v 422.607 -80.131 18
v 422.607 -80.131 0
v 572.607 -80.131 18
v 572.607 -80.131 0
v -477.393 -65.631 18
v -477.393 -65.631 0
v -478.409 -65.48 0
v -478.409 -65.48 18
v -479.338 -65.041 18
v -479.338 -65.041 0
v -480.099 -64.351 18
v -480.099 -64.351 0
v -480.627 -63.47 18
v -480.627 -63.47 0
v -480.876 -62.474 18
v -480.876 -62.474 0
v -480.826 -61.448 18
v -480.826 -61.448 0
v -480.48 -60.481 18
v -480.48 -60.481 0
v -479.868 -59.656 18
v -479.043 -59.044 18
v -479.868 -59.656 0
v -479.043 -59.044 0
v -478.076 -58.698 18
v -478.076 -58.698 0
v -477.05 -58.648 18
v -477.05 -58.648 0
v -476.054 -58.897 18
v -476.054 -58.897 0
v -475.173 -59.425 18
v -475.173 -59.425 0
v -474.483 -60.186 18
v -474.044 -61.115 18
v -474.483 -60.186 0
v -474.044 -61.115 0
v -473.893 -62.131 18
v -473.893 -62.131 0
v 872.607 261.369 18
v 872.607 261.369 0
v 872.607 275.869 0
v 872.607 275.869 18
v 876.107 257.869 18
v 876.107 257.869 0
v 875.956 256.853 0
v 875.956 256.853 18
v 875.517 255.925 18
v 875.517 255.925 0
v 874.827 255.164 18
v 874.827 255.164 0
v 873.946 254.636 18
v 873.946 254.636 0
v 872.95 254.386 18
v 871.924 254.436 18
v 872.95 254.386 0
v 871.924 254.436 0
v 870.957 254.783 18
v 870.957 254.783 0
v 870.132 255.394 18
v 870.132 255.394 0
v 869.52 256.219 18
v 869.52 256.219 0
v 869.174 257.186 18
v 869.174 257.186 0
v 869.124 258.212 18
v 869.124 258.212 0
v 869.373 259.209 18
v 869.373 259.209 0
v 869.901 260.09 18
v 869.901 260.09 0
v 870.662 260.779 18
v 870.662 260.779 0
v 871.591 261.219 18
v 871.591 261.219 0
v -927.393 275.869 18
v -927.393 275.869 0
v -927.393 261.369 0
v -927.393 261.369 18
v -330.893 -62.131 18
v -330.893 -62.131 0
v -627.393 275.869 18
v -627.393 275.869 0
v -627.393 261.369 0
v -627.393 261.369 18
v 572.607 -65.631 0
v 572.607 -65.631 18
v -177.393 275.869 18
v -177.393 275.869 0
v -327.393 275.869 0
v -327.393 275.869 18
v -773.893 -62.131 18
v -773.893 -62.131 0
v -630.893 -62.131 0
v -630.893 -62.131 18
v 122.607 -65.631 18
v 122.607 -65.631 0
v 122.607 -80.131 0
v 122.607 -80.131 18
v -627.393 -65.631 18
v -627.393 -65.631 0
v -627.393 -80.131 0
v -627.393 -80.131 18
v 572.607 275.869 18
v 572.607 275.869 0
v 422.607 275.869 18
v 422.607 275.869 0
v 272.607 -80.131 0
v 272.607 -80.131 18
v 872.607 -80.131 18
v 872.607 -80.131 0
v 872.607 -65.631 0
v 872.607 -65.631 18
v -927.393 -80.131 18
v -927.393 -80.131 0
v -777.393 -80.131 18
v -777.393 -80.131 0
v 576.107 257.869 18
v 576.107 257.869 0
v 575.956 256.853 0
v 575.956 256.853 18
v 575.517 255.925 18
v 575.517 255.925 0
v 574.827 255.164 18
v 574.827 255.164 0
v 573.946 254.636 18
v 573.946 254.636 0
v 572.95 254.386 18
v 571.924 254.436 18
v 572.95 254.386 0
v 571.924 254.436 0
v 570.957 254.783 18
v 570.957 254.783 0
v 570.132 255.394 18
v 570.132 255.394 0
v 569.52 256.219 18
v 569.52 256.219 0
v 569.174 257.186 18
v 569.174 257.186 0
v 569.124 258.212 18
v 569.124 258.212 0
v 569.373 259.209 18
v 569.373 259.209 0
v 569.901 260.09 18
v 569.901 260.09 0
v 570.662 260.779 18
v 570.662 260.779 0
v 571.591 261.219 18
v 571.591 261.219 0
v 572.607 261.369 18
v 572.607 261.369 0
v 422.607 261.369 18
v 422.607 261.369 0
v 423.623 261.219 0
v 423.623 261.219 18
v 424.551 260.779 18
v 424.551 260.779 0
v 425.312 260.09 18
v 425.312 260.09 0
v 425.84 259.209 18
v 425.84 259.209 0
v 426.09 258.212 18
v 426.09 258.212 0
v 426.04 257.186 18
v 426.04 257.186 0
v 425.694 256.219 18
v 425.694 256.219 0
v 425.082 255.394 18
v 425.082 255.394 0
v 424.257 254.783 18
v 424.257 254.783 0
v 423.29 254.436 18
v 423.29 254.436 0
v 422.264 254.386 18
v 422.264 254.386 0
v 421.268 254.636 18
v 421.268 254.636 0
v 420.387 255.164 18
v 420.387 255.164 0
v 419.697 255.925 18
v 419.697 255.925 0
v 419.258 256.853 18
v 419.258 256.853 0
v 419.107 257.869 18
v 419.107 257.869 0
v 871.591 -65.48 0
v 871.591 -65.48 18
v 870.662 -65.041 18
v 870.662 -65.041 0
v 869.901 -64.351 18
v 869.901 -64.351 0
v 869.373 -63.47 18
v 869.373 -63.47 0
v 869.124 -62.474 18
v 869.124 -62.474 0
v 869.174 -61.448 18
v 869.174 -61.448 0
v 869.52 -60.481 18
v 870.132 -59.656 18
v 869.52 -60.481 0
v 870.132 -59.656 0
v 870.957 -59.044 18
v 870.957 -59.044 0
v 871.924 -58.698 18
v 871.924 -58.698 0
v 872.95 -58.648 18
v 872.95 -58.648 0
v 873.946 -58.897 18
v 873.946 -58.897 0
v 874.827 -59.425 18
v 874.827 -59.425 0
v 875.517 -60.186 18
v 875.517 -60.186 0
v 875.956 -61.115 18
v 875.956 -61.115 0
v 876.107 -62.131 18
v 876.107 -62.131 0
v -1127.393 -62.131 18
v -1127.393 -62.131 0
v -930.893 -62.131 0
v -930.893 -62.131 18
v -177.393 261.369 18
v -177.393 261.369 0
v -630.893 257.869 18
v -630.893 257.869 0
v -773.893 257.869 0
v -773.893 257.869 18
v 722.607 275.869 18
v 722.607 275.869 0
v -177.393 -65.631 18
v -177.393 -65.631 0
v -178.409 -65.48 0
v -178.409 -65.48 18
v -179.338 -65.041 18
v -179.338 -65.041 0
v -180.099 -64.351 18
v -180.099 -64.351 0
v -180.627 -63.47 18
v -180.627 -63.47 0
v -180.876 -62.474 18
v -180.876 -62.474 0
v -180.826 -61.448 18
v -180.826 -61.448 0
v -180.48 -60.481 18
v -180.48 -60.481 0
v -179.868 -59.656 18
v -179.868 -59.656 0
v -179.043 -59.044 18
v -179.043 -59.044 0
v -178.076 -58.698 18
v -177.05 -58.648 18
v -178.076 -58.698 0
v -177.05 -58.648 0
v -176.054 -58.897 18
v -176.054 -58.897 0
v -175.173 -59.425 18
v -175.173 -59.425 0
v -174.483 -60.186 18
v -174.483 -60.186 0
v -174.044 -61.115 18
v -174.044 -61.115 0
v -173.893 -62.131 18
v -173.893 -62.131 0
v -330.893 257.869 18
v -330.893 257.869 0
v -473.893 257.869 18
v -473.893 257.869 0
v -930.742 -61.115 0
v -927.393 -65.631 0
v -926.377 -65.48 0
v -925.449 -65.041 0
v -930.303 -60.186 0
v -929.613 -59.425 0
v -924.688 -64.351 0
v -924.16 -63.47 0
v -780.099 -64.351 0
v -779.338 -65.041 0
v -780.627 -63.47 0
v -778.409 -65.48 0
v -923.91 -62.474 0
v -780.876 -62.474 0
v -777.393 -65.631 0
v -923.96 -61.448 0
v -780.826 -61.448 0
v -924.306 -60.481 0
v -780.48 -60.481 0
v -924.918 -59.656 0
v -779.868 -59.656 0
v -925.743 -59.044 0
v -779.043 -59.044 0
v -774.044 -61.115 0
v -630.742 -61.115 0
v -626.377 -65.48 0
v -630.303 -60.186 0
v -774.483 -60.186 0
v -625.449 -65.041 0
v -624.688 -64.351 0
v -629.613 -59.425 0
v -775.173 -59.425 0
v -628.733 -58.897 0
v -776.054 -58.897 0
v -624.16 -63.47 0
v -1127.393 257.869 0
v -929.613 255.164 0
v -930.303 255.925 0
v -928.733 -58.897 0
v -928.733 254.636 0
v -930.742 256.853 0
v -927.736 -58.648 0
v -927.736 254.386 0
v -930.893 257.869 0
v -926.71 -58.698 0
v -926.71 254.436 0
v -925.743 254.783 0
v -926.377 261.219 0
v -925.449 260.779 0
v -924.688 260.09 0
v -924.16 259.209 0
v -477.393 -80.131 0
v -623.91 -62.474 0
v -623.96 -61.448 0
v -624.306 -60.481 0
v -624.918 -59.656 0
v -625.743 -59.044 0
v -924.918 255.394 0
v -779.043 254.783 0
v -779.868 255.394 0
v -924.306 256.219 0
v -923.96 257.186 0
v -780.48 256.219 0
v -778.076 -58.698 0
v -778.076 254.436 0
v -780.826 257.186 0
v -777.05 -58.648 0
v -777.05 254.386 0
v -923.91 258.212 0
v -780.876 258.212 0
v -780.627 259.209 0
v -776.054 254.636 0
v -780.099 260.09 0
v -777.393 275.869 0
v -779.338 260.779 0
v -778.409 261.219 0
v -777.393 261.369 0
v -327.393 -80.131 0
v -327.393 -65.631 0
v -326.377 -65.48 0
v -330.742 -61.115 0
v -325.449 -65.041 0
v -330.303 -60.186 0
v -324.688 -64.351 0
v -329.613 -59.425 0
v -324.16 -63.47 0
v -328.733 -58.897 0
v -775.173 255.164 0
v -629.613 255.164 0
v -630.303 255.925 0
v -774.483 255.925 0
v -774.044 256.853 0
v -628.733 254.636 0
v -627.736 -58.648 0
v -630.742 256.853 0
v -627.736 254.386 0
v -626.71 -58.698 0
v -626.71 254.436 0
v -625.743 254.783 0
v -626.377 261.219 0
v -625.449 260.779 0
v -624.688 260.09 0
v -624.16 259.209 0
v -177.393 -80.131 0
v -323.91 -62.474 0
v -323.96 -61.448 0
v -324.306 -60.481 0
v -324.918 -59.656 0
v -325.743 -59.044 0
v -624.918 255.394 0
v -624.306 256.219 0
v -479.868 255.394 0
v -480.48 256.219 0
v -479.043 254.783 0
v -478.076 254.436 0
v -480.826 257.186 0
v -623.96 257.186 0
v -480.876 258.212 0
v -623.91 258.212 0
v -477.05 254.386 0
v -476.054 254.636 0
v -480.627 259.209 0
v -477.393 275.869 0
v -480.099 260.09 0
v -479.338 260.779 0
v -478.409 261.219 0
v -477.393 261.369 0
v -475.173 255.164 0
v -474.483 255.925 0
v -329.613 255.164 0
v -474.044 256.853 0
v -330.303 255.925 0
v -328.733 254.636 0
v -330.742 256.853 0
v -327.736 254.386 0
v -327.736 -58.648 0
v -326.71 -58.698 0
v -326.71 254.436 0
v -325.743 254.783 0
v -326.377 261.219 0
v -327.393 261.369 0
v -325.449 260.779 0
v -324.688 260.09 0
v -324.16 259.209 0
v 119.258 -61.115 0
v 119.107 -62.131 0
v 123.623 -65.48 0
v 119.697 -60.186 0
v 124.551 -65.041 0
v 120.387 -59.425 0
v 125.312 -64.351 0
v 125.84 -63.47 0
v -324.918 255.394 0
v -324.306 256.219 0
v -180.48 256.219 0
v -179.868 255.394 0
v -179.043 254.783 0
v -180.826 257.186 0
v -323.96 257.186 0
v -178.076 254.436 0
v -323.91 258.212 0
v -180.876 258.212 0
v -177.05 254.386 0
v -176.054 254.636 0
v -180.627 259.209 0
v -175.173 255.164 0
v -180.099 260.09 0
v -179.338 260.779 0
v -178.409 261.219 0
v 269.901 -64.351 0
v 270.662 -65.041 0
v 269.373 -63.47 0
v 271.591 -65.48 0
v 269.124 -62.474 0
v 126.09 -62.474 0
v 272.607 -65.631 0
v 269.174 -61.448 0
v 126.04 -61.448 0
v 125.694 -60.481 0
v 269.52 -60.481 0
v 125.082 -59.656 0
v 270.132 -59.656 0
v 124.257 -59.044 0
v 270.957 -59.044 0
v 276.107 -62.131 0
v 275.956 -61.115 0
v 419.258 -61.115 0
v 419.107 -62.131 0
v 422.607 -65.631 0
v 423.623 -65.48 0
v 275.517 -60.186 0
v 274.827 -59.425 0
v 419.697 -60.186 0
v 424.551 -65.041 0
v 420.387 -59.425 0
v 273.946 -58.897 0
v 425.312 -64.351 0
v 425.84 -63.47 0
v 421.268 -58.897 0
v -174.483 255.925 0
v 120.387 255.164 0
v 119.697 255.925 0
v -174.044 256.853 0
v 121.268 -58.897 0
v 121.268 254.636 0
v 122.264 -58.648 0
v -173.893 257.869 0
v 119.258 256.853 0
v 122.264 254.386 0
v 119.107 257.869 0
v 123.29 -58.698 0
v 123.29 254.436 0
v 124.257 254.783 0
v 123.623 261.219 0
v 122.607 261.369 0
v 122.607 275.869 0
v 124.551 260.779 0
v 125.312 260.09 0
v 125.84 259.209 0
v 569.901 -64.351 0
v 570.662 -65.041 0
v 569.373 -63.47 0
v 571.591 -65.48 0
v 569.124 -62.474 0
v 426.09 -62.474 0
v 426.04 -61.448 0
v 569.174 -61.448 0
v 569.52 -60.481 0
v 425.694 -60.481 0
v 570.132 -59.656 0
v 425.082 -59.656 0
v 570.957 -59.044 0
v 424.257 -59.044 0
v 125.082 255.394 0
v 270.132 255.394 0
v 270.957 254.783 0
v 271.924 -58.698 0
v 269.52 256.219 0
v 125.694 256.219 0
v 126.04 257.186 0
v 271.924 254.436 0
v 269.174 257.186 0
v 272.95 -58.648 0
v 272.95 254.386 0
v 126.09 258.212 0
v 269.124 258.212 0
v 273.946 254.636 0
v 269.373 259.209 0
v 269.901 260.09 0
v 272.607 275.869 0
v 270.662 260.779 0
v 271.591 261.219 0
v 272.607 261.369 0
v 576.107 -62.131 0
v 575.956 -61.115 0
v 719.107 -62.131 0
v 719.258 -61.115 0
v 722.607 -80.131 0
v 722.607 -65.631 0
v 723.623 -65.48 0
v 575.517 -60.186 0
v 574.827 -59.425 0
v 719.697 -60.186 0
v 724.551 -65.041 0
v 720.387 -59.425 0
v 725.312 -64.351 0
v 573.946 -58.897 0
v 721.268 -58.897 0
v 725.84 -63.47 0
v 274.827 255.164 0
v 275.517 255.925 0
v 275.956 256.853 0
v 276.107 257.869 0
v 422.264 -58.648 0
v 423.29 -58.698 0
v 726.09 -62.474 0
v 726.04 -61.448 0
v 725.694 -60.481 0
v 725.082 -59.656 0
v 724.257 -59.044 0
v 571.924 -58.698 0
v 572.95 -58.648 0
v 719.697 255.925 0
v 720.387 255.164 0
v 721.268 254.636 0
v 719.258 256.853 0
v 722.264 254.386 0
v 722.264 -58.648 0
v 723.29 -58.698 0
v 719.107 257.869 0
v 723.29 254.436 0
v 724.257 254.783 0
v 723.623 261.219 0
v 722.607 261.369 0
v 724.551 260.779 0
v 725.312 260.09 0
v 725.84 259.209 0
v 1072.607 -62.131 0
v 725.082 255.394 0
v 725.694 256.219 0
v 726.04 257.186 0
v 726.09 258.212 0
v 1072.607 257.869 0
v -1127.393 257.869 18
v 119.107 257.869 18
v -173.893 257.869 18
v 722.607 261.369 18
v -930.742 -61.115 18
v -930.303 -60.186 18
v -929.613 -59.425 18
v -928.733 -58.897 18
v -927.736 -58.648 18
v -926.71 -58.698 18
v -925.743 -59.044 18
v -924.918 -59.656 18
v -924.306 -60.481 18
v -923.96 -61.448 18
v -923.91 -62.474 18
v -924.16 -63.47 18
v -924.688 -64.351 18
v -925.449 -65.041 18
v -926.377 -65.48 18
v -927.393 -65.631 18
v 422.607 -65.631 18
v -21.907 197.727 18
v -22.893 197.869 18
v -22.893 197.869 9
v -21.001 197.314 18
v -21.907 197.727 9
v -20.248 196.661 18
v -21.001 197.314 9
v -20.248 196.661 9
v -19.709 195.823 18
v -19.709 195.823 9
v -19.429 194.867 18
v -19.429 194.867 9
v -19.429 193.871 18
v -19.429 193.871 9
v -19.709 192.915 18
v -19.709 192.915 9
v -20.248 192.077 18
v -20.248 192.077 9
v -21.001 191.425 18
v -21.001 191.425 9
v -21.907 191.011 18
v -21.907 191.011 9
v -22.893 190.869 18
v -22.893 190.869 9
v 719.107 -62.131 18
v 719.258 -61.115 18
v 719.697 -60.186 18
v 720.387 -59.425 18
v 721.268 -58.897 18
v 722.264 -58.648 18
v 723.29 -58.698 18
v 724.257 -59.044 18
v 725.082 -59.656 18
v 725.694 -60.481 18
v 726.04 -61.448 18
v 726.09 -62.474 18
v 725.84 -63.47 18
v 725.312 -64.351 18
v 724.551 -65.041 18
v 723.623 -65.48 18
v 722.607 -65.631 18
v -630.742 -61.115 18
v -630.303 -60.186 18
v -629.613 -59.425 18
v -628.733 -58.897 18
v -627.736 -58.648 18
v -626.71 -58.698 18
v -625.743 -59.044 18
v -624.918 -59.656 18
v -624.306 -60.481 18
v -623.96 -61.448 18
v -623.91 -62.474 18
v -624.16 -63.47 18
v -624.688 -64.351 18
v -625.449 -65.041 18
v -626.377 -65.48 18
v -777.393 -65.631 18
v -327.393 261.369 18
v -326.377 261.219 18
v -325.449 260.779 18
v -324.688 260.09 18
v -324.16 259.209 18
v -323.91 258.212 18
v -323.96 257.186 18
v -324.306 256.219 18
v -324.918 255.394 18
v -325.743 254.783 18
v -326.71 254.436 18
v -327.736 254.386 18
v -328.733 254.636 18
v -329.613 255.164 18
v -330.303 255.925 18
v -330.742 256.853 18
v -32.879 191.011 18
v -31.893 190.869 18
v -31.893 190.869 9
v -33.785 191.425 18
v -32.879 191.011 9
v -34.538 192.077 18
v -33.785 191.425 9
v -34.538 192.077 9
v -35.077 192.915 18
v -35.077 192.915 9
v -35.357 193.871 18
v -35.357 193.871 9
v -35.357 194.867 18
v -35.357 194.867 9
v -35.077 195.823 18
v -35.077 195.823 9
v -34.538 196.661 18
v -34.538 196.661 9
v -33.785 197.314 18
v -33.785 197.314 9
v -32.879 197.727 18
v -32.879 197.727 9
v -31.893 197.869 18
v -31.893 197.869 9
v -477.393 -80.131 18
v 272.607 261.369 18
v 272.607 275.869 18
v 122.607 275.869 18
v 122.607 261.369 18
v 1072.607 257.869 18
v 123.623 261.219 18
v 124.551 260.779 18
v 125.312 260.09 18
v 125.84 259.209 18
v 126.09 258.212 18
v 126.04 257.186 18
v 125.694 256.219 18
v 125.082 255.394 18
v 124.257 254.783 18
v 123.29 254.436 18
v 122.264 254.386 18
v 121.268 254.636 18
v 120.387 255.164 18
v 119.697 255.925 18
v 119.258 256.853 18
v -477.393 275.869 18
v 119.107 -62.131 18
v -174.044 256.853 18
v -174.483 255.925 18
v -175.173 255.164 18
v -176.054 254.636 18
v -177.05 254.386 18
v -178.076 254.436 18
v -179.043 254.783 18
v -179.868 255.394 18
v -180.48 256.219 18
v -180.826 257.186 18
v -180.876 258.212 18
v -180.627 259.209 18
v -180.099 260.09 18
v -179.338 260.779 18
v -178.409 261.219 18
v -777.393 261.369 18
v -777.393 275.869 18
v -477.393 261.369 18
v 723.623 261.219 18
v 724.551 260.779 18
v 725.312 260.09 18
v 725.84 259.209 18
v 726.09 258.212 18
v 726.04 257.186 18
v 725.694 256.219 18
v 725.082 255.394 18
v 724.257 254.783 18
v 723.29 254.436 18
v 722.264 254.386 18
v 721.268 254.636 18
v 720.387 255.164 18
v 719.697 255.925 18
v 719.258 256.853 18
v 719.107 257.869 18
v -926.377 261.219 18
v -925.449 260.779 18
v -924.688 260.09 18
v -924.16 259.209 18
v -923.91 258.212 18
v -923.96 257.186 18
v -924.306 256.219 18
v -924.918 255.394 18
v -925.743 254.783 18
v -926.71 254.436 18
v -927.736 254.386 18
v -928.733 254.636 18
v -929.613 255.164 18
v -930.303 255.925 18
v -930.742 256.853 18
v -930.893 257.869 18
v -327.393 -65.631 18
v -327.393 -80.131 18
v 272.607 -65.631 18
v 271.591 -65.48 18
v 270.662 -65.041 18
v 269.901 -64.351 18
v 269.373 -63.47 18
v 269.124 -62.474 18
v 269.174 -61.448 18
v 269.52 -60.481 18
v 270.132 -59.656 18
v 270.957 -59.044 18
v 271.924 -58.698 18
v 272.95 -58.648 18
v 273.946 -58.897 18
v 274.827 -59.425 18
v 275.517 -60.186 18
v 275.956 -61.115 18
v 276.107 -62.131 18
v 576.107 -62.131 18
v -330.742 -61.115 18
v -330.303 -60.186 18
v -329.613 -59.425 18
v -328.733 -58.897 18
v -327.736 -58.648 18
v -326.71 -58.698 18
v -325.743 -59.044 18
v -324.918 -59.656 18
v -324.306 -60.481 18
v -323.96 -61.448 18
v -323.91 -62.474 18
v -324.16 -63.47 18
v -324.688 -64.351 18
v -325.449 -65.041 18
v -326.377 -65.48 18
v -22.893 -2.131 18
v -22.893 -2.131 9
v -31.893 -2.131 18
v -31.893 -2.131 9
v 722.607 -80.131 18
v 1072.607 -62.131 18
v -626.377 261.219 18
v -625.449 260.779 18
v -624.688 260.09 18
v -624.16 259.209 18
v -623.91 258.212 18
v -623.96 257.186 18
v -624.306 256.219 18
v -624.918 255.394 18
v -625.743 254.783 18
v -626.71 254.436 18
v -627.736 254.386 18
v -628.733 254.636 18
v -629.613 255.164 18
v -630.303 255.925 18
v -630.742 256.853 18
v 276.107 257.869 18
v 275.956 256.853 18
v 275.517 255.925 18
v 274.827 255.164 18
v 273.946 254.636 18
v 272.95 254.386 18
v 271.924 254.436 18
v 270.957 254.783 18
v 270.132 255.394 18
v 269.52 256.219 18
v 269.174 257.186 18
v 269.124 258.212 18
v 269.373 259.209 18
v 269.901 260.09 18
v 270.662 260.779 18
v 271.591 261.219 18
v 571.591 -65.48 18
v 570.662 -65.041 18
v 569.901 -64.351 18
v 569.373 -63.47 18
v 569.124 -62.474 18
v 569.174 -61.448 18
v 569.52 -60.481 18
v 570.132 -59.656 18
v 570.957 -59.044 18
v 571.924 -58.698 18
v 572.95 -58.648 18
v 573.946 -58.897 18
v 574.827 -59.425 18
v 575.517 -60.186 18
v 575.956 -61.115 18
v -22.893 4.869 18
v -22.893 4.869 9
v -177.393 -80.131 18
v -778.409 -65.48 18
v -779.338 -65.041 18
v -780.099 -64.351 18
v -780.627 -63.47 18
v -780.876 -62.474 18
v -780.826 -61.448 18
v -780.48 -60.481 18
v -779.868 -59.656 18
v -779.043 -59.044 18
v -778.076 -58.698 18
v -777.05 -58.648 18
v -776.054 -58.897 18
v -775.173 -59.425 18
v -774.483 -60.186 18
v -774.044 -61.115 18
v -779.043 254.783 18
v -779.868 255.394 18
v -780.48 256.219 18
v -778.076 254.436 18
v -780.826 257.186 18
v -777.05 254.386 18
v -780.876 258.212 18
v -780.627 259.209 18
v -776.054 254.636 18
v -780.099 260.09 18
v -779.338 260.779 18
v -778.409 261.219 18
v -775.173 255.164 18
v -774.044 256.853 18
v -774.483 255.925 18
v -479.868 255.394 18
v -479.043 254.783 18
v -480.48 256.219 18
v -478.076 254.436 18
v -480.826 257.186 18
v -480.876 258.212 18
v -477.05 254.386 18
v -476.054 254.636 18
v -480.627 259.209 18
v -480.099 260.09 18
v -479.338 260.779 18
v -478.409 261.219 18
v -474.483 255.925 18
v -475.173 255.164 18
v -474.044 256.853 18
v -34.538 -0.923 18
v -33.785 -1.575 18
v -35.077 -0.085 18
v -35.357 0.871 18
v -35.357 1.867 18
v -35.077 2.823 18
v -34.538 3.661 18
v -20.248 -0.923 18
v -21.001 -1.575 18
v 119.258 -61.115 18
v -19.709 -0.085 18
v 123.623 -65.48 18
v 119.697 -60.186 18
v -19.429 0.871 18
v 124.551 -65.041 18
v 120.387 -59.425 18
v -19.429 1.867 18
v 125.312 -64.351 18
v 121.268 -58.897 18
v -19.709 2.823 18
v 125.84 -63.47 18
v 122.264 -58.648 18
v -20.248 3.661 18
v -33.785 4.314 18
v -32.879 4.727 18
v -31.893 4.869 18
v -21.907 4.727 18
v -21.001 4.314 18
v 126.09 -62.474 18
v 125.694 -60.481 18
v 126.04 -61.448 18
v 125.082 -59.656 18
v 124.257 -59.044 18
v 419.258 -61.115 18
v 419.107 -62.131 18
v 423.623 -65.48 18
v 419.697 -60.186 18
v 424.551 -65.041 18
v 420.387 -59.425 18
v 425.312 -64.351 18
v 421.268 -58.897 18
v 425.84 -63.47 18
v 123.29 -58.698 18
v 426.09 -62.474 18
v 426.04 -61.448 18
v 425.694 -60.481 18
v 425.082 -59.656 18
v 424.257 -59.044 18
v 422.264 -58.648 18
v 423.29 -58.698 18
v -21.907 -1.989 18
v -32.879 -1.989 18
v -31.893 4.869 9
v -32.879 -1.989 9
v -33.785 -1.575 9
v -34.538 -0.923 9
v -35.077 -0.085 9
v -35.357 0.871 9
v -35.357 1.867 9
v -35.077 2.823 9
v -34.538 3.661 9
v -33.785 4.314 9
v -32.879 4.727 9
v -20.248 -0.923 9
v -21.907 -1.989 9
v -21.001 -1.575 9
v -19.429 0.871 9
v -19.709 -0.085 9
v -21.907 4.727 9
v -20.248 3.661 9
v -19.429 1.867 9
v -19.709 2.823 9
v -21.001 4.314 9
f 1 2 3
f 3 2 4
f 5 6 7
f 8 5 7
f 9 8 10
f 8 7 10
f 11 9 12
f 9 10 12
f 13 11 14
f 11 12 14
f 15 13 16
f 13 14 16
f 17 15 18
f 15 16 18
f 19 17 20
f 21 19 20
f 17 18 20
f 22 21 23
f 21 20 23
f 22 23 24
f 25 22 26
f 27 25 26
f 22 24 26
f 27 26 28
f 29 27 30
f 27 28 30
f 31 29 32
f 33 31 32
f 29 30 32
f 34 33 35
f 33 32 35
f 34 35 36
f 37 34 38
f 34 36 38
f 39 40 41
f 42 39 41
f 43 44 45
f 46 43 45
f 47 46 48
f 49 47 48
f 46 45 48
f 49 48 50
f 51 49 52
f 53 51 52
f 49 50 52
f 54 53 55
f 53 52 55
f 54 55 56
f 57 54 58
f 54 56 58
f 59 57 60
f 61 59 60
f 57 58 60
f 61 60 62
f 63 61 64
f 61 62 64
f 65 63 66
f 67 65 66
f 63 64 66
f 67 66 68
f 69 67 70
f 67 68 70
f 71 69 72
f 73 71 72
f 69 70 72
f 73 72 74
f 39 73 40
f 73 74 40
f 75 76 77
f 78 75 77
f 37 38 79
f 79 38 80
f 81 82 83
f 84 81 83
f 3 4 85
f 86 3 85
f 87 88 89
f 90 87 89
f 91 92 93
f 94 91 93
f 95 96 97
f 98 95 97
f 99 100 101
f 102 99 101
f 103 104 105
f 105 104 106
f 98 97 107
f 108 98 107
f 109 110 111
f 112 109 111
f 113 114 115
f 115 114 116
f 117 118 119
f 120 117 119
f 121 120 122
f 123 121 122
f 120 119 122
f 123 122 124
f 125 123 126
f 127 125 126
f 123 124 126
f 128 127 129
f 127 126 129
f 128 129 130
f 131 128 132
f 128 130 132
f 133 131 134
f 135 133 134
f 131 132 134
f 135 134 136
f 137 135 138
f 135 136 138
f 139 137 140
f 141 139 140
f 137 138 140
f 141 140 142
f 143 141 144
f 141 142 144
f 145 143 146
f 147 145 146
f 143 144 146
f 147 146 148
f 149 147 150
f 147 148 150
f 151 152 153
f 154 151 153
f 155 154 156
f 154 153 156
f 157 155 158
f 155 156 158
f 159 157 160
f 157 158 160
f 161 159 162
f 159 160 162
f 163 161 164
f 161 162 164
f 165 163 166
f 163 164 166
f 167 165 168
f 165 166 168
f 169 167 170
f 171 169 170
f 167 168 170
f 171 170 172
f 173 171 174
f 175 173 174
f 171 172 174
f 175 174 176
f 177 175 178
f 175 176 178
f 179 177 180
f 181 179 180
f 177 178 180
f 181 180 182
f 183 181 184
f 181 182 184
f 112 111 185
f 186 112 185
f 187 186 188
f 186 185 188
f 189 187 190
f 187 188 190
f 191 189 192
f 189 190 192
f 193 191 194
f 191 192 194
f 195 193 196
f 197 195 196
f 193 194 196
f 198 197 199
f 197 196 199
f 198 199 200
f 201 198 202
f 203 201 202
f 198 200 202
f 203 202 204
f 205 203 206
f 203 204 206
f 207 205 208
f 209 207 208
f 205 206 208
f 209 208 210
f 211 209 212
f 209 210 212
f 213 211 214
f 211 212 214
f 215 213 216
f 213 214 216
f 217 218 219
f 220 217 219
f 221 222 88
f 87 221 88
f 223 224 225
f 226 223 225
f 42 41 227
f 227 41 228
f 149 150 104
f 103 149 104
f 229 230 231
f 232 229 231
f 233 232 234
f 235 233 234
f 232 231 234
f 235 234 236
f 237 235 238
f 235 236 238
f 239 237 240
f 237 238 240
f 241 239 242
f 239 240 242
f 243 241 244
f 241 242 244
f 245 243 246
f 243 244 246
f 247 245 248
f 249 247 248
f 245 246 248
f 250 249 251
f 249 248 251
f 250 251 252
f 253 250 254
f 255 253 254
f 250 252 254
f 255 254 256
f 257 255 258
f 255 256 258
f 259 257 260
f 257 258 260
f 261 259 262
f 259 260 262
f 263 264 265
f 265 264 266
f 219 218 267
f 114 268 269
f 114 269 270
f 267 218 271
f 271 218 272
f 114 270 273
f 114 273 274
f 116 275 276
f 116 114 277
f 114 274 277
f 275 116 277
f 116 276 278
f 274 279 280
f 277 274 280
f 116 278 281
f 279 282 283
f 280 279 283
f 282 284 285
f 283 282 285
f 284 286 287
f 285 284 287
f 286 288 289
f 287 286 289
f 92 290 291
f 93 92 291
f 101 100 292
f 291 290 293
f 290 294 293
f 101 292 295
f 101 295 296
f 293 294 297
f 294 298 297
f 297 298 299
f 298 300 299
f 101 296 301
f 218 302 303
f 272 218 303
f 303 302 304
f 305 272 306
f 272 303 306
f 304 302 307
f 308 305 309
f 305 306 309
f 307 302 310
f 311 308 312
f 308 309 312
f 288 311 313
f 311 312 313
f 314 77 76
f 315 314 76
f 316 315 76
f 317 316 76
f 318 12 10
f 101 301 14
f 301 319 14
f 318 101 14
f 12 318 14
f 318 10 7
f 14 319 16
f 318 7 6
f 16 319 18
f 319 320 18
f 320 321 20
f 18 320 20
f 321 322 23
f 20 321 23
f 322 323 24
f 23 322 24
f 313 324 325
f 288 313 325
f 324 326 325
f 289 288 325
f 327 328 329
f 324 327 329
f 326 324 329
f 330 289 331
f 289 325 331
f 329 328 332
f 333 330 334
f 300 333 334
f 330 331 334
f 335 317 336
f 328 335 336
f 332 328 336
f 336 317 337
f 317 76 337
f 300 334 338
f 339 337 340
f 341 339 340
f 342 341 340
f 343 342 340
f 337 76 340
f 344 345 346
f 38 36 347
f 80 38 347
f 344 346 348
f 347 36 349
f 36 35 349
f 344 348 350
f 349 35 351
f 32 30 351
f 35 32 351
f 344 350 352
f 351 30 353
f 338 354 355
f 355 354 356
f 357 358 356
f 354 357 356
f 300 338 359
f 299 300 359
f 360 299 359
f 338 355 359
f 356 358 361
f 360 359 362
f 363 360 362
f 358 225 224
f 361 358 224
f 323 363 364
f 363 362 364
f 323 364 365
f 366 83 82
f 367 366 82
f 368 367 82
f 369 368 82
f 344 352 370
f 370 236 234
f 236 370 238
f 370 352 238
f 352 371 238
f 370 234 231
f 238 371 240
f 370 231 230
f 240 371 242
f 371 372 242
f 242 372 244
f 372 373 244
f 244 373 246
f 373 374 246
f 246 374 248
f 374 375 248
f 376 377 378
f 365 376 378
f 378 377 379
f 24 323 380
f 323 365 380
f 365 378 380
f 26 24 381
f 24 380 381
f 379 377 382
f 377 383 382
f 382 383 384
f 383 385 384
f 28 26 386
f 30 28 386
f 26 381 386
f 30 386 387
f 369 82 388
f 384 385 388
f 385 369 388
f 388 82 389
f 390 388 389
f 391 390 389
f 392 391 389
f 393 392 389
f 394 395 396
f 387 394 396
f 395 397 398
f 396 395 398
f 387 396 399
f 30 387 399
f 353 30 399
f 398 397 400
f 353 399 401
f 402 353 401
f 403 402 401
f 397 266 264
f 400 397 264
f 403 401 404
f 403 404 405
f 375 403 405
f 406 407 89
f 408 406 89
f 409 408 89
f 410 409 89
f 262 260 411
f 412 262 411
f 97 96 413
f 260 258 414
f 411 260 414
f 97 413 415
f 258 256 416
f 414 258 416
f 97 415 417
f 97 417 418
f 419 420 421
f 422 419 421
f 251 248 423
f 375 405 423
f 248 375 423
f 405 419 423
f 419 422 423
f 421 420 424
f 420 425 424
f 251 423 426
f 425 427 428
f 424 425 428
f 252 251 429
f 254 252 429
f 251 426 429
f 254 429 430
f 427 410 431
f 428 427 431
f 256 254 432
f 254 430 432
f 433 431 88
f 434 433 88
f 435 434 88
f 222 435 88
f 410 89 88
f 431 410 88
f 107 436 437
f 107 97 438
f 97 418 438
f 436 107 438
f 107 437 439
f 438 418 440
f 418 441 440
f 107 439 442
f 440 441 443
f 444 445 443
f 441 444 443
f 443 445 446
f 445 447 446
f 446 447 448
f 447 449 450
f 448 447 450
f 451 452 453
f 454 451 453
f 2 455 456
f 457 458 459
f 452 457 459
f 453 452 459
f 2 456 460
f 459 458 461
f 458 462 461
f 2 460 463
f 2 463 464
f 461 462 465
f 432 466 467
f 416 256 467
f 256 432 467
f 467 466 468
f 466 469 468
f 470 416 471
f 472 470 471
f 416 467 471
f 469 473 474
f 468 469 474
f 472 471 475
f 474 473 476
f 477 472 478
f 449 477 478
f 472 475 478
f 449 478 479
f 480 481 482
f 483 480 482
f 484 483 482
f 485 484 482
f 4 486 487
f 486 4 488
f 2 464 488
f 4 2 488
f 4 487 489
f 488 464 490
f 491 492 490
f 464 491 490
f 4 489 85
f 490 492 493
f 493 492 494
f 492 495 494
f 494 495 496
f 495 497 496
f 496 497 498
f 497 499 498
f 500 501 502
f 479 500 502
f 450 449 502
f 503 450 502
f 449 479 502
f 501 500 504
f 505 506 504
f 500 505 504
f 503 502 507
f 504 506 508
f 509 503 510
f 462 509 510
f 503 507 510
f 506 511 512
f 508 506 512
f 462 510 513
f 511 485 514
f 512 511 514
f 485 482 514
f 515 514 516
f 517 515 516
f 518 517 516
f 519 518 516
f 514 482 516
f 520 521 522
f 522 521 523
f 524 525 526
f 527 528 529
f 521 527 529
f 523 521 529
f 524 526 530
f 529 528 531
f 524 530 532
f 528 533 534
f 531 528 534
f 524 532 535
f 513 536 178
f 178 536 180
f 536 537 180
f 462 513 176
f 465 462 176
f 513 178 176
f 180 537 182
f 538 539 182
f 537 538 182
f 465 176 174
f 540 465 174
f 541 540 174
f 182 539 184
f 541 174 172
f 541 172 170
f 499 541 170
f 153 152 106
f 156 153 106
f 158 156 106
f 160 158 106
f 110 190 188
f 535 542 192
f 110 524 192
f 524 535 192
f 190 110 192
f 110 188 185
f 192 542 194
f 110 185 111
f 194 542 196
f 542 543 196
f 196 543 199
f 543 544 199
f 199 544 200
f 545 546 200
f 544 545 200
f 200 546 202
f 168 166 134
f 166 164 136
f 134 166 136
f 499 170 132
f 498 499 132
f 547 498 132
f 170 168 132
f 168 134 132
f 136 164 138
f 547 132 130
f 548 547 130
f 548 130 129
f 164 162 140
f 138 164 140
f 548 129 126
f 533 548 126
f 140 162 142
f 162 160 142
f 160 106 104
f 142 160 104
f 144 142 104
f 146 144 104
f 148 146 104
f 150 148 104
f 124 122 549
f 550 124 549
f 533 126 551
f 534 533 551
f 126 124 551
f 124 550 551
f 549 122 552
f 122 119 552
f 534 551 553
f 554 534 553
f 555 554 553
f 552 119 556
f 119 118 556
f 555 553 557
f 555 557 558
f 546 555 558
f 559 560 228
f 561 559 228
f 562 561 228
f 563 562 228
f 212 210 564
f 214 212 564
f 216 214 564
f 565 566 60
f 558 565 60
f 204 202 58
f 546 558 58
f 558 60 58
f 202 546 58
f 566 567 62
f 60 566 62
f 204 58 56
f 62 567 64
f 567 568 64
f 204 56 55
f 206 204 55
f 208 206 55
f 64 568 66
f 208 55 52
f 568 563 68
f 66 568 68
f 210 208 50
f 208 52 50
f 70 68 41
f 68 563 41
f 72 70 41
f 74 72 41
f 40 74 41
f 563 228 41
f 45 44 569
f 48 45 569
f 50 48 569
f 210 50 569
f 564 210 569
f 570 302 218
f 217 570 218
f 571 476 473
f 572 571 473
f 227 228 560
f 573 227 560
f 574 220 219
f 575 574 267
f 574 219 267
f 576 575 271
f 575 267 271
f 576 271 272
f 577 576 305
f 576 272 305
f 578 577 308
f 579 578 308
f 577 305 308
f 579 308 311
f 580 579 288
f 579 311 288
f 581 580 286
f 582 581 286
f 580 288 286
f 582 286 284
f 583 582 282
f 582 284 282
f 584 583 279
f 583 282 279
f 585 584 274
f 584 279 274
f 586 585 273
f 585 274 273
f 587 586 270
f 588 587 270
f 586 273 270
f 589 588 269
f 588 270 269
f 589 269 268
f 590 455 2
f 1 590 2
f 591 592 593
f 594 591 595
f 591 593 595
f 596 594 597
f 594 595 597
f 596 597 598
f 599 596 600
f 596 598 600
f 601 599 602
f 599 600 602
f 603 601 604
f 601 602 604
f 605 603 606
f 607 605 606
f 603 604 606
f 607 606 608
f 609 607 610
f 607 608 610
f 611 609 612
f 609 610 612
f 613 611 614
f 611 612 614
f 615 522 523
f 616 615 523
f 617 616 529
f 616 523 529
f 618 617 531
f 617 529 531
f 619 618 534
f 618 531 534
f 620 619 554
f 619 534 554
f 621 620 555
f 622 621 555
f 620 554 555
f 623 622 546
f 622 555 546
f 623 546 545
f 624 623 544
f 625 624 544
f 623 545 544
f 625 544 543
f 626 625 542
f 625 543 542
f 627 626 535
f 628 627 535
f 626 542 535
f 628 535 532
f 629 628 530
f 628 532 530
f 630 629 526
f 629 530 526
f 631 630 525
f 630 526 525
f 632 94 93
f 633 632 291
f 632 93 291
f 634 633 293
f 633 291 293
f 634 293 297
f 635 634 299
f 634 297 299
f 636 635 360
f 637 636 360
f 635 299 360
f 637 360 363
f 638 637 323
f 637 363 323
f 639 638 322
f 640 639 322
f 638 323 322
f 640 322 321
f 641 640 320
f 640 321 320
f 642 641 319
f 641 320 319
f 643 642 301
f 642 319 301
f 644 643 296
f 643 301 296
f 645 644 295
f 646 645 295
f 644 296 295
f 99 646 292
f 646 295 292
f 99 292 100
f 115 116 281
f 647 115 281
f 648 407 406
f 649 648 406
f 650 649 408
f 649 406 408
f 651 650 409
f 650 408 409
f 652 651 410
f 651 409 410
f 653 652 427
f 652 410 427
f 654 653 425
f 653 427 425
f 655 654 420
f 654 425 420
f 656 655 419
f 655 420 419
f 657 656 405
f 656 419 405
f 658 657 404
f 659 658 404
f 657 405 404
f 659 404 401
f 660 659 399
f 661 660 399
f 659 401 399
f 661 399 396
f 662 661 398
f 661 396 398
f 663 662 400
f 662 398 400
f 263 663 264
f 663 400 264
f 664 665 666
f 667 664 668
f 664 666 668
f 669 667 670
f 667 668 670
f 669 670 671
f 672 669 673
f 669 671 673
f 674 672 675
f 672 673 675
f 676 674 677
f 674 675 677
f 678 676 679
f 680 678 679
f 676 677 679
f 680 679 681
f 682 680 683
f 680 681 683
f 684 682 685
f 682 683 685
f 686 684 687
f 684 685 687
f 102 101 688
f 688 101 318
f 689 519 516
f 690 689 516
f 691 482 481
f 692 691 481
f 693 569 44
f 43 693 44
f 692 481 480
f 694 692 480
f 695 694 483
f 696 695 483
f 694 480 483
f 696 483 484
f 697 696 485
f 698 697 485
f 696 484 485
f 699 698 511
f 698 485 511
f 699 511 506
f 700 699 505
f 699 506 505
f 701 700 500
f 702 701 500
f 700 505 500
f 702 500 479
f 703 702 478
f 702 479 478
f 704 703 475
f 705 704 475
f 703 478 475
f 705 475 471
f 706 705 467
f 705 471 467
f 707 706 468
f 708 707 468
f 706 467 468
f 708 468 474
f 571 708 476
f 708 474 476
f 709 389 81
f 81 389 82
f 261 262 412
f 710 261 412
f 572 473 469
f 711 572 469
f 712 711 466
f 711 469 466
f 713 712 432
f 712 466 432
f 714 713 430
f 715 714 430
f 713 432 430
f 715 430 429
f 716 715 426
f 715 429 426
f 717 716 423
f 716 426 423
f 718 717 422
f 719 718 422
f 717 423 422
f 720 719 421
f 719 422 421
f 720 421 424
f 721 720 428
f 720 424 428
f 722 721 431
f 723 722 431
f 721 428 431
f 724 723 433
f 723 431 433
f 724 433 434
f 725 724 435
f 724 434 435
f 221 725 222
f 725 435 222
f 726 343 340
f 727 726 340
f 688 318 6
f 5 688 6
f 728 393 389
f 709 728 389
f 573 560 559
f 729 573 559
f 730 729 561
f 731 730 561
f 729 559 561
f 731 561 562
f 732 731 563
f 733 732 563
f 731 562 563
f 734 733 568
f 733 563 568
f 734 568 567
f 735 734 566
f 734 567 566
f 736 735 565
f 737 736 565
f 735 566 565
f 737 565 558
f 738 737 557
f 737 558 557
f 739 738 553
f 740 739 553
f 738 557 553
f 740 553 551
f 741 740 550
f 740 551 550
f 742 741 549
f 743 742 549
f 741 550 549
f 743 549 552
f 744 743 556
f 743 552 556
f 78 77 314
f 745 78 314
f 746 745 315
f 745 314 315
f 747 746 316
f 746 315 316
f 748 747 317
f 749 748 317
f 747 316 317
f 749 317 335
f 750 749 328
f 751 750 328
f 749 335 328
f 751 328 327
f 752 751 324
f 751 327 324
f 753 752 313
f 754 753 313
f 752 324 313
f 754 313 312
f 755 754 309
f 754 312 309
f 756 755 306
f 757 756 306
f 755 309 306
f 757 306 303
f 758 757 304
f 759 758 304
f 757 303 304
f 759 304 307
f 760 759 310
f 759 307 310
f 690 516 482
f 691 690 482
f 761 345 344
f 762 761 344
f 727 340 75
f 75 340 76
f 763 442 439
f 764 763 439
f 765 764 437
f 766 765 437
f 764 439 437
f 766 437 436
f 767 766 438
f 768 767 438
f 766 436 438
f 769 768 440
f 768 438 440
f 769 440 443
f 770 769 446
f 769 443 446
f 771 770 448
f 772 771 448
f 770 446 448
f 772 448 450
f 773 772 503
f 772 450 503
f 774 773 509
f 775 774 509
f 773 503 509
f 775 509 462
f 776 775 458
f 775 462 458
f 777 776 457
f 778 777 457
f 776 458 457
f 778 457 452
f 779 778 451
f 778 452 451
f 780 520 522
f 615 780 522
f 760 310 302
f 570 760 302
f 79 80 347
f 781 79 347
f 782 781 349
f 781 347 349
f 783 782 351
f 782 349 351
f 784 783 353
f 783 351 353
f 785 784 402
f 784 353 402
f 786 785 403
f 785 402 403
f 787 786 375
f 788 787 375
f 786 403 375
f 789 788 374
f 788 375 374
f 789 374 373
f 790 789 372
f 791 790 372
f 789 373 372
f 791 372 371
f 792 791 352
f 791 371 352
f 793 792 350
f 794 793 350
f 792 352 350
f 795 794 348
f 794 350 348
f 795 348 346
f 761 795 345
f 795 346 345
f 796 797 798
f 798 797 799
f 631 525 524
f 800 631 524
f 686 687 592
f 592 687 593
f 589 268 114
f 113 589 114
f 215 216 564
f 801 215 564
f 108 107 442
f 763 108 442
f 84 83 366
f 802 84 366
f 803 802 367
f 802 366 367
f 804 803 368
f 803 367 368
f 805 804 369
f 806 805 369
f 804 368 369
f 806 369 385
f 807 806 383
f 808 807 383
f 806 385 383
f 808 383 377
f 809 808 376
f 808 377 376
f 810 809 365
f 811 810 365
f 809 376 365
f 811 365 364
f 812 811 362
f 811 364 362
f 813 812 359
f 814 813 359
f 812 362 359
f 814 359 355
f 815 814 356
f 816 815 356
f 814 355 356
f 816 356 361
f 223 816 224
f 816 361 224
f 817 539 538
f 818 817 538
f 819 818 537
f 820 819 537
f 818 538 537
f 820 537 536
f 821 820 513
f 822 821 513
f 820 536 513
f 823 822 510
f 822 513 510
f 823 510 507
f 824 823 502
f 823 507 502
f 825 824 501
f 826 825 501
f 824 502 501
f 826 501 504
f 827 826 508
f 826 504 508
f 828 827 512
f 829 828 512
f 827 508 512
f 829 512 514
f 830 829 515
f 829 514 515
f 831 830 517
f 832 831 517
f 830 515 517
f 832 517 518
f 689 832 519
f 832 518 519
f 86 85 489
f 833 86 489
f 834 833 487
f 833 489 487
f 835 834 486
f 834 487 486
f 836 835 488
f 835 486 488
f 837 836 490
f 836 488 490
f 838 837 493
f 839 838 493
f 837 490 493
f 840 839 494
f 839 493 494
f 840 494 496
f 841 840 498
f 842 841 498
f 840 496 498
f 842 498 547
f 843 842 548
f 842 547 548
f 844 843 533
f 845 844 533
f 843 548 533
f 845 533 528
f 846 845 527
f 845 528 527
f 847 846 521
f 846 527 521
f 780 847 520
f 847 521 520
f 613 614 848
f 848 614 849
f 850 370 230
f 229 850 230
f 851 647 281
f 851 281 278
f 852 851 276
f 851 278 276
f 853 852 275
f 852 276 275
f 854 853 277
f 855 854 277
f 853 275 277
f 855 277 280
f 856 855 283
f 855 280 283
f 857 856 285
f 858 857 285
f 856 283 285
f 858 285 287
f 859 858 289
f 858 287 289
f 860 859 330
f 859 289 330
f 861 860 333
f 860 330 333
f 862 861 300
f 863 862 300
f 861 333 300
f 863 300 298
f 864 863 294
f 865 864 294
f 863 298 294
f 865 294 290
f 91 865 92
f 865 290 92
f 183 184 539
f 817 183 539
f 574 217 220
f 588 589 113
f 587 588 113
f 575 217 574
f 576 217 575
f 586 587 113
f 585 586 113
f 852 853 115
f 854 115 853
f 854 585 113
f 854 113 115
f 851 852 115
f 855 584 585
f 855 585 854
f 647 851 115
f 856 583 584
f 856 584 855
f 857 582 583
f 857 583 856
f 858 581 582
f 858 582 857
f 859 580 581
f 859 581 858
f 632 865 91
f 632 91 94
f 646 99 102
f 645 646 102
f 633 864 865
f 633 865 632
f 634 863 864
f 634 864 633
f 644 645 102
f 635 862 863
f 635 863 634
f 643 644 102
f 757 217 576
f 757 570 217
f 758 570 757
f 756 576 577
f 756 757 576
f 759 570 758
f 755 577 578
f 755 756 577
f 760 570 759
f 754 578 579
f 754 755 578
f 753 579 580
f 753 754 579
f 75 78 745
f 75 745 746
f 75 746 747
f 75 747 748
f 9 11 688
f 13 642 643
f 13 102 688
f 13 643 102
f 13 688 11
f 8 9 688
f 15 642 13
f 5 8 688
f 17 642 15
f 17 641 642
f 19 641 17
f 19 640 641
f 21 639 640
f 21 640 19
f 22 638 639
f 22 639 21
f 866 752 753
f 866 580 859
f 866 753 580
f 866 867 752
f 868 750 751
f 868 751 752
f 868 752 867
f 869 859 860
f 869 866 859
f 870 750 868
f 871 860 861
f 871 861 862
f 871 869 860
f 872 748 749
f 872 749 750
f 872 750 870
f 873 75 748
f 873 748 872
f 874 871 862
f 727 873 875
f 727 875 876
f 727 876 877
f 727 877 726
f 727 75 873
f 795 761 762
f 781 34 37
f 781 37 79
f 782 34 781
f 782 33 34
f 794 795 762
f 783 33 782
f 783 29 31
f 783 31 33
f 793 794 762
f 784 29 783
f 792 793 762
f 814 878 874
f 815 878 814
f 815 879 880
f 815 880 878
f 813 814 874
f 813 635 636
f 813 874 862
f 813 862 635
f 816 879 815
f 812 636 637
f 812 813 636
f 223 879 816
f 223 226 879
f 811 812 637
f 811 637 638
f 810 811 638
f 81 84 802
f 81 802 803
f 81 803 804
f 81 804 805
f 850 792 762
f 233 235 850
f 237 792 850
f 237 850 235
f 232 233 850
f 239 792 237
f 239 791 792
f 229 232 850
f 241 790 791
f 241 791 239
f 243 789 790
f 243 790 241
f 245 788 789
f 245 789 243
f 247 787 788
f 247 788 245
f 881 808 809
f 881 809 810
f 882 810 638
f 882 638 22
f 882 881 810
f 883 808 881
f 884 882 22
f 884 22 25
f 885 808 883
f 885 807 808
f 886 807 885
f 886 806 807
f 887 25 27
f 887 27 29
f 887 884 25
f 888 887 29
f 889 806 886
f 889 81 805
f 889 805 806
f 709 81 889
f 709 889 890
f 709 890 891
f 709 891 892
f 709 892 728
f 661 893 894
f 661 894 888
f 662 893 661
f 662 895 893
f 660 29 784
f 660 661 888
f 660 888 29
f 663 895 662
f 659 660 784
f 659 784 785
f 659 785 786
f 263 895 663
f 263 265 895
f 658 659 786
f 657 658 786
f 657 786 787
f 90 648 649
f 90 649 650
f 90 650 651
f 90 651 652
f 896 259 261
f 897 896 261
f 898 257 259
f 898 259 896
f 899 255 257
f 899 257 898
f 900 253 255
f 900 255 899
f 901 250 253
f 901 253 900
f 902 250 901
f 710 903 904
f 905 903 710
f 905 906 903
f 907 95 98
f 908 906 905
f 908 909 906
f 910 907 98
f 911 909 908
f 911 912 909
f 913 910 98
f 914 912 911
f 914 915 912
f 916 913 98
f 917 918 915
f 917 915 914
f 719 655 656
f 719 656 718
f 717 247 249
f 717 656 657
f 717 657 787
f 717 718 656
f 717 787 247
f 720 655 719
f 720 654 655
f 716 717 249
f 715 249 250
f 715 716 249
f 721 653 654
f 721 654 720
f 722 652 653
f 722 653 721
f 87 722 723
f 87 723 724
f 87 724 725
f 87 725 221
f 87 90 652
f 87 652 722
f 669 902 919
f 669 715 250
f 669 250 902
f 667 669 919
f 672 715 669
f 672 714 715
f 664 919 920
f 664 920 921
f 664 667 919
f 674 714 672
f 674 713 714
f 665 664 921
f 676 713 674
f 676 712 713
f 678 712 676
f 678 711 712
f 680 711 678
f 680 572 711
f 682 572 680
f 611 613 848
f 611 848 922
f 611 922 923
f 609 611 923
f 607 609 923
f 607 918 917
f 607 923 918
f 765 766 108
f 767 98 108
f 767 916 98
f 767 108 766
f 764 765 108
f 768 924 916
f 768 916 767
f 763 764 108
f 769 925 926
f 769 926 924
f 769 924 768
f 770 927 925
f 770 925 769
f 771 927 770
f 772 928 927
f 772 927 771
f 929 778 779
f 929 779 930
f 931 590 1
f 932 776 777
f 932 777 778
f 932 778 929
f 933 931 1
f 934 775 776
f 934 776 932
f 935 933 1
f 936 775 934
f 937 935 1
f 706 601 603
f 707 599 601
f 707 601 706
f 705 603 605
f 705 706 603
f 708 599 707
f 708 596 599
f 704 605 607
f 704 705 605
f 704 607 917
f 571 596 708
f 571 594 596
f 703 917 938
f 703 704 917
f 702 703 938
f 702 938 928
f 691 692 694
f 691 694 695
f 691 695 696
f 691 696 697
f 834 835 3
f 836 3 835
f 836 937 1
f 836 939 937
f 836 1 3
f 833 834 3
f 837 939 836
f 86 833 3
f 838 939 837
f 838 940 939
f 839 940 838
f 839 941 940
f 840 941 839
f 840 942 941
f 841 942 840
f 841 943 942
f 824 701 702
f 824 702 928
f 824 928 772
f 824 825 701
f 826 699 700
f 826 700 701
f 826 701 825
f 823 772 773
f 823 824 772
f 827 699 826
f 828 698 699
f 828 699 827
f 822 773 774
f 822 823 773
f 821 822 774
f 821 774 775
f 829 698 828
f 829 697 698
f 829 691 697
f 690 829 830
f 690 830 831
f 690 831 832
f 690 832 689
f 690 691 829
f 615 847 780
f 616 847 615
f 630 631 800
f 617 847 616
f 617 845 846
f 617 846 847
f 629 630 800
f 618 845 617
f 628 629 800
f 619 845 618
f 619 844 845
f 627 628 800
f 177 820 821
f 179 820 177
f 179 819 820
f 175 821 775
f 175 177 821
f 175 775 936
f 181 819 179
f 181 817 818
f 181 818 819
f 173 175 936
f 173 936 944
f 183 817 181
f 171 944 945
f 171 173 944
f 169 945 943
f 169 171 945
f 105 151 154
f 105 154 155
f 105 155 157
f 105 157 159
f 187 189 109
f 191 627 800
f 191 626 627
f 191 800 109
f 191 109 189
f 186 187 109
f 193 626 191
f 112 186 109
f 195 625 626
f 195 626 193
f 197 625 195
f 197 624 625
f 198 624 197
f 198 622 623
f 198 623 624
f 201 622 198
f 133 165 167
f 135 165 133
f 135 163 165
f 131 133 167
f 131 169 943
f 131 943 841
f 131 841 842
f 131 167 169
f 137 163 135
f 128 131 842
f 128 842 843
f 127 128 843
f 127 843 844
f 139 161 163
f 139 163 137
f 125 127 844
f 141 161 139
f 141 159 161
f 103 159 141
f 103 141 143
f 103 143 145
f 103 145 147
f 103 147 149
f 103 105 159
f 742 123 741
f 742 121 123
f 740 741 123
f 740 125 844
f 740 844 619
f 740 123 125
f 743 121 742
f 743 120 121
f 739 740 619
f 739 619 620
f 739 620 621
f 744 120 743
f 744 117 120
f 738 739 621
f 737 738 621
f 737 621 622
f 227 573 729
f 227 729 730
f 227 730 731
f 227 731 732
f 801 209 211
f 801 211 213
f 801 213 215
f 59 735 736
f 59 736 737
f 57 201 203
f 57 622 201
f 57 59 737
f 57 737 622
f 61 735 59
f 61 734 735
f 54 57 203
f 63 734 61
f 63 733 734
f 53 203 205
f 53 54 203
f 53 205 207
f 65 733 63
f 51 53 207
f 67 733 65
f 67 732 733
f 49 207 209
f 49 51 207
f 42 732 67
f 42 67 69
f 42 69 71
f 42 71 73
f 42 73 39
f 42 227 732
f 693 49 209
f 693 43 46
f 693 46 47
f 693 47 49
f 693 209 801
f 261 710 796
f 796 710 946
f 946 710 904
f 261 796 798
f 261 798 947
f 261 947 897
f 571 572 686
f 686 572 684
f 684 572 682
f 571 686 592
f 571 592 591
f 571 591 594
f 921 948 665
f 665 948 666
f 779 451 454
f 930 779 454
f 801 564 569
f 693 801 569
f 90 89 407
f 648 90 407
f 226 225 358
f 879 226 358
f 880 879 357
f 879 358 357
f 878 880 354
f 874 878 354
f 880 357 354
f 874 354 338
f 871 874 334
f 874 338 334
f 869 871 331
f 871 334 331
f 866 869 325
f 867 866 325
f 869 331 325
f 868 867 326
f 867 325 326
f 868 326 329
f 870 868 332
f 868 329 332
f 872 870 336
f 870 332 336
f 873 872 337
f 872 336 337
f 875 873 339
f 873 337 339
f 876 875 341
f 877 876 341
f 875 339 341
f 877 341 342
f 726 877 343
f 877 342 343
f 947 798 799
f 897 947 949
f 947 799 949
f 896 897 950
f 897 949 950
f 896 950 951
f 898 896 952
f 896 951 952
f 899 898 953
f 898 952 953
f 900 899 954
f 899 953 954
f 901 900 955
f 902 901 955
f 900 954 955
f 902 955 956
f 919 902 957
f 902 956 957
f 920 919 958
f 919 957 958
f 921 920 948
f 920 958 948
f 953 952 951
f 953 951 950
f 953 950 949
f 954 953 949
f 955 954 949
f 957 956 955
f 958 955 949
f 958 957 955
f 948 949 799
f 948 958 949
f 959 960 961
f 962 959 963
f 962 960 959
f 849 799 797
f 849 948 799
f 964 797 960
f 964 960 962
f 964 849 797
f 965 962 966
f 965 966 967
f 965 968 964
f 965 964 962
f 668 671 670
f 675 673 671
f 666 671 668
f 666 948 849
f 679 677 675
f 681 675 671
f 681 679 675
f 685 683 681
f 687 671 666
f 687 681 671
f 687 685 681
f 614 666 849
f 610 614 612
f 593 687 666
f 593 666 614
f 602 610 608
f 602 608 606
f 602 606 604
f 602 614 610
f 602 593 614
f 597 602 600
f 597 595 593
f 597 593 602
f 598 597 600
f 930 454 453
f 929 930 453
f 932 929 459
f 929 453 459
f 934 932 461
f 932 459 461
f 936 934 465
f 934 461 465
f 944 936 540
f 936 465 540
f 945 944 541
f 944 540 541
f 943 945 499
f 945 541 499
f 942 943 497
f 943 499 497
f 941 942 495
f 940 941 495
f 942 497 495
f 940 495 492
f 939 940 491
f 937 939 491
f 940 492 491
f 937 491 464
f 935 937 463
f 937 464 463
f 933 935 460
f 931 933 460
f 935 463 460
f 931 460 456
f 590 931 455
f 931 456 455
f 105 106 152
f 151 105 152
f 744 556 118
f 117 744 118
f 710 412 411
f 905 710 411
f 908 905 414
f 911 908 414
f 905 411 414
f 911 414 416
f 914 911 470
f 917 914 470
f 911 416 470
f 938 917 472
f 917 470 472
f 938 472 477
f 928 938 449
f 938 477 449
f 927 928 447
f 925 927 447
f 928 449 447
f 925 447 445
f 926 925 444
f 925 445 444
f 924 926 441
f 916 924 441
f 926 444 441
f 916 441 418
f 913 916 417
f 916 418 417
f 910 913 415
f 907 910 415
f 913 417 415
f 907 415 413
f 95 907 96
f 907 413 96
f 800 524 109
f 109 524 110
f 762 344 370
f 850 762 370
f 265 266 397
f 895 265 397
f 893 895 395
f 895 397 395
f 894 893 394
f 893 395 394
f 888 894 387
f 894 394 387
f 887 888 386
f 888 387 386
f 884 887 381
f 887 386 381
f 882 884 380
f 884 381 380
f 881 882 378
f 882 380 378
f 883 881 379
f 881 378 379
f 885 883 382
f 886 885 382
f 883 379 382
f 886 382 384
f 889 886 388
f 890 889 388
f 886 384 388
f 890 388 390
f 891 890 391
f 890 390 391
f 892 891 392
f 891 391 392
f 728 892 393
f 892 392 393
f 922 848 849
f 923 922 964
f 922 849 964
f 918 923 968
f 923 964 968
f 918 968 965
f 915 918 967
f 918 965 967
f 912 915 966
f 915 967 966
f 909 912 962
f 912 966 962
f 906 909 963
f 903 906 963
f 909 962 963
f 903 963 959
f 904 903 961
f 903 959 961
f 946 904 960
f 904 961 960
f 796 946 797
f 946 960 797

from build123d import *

# Parameters (mm, degrees)
F1_DEPTH = 18
F2_DEPTH = 9


# Not quite as in the source:
# - ends of sketch curves that miss each other by under 0.0002 mm in the source are joined


with BuildPart() as f1:
    # F0 (on Top) → F1 (new body)
    with BuildSketch(Plane.XY):
        with BuildLine():
            Line((-1127.3931139915, 97.8692322969), (-1127.3931139915, -62.1307669387))
            Line((-1127.3931139915, -62.1307669387), (-930.8931139915, -62.1307669387))
            ThreePointArc((-930.8931139915, -62.1307669387), (-924.9182402574, -59.6558932046), (-927.3931139915, -65.6307669387))
            Line((-927.3931139915, -65.6307669387), (-927.3931139915, -80.1307669387))
            Line((-927.3931139915, -80.1307669387), (-777.3931378334, -80.1307669387))
            Line((-777.3931378334, -80.1307669387), (-777.3931378334, -65.6307669387))
            ThreePointArc((-777.3931378334, -65.6307669387), (-779.8680115675, -59.6558932046), (-773.8931378334, -62.1307669387))
            Line((-773.8931378334, -62.1307669387), (-630.8931139915, -62.1307669387))
            ThreePointArc((-630.8931139915, -62.1307669387), (-624.9182402574, -59.6558932046), (-627.3931139915, -65.6307669387))
            Line((-627.3931139915, -65.6307669387), (-627.3931139915, -80.1307669387))
            Line((-627.3931139915, -80.1307669387), (-477.3931378334, -80.1307669387))
            Line((-477.3931378334, -80.1307669387), (-477.3931378334, -65.6307669387))
            ThreePointArc((-477.3931378334, -65.6307669387), (-479.8680115675, -59.6558932046), (-473.8931378334, -62.1307669387))
            Line((-473.8931378334, -62.1307669387), (-330.8931139915, -62.1307669387))
            ThreePointArc((-330.8931139915, -62.1307669387), (-324.9182402574, -59.6558932046), (-327.3931139915, -65.6307669387))
            Line((-327.3931139915, -65.6307669387), (-327.3931139915, -80.1307669387))
            Line((-327.3931139915, -80.1307669387), (-177.3931378334, -80.1307669387))
            Line((-177.3931378334, -80.1307669387), (-177.3931378334, -65.6307669387))
            ThreePointArc((-177.3931378334, -65.6307669387), (-179.8680115675, -59.6558932046), (-173.8931378334, -62.1307669387))
            Line((-173.8931378334, -62.1307669387), (-27.3931378334, -62.1307669387))
            Line((-27.3931378334, -62.1307669387), (119.1069098503, -62.1307669387))
            ThreePointArc((119.1069098503, -62.1307669387), (125.0817835845, -59.6558932046), (122.6069098503, -65.6307669387))
            Line((122.6069098503, -65.6307669387), (122.6069098503, -80.1307669387))
            Line((122.6069098503, -80.1307669387), (272.6068860085, -80.1307669387))
            Line((272.6068860085, -80.1307669387), (272.6068860085, -65.6307669387))
            ThreePointArc((272.6068860085, -65.6307669387), (270.1320122743, -59.6558932046), (276.1068860085, -62.1307669387))
            Line((276.1068860085, -62.1307669387), (419.1069098503, -62.1307669387))
            ThreePointArc((419.1069098503, -62.1307669387), (425.0817835845, -59.6558932046), (422.6069098503, -65.6307669387))
            Line((422.6069098503, -65.6307669387), (422.6069098503, -80.1307669387))
            Line((422.6069098503, -80.1307669387), (572.6068860085, -80.1307669387))
            Line((572.6068860085, -80.1307669387), (572.6068860085, -65.6307669387))
            ThreePointArc((572.6068860085, -65.6307669387), (570.1320122743, -59.6558932046), (576.1068860085, -62.1307669387))
            Line((576.1068860085, -62.1307669387), (719.1069098503, -62.1307669387))
            ThreePointArc((719.1069098503, -62.1307669387), (725.0817835845, -59.6558932046), (722.6069098503, -65.6307669387))
            Line((722.6069098503, -65.6307669387), (722.6069098503, -80.1307669387))
            Line((722.6069098503, -80.1307669387), (872.6068860085, -80.1307669387))
            Line((872.6068860085, -80.1307669387), (872.6068860085, -65.6307669387))
            ThreePointArc((872.6068860085, -65.6307669387), (870.1320122743, -59.6558932046), (876.1068860085, -62.1307669387))
            Line((876.1068860085, -62.1307669387), (1072.6068860085, -62.1307669387))
            Line((1072.6068860085, -62.1307669387), (1072.6068860085, 97.8692322969))
            Line((1072.6068860085, 97.8692322969), (1072.6068860085, 257.8692315326))
            Line((1072.6068860085, 257.8692315326), (876.1068860085, 257.8692315326))
            ThreePointArc((876.1068860085, 257.8692315326), (870.1320122743, 255.3943577985), (872.6068860085, 261.3692315326))
            Line((872.6068860085, 261.3692315326), (872.6068860085, 275.8692315326))
            Line((872.6068860085, 275.8692315326), (722.6069098503, 275.8692315326))
            Line((722.6069098503, 275.8692315326), (722.6069098503, 261.3692315326))
            ThreePointArc((722.6069098503, 261.3692315326), (725.0817835845, 255.3943577985), (719.1069098503, 257.8692315326))
            Line((719.1069098503, 257.8692315326), (576.1068860085, 257.8692315326))
            ThreePointArc((576.1068860085, 257.8692315326), (570.1320122743, 255.3943577985), (572.6068860085, 261.3692315326))
            Line((572.6068860085, 261.3692315326), (572.6068860085, 275.8692315326))
            Line((572.6068860085, 275.8692315326), (422.6069098503, 275.8692315326))
            Line((422.6069098503, 275.8692315326), (422.6069098503, 261.3692315326))
            ThreePointArc((422.6069098503, 261.3692315326), (425.0817835845, 255.3943577985), (419.1069098503, 257.8692315326))
            Line((419.1069098503, 257.8692315326), (276.1068860085, 257.8692315326))
            ThreePointArc((276.1068860085, 257.8692315326), (270.1320122743, 255.3943577985), (272.6068860085, 261.3692315326))
            Line((272.6068860085, 261.3692315326), (272.6068860085, 275.8692315326))
            Line((272.6068860085, 275.8692315326), (122.6069098503, 275.8692315326))
            Line((122.6069098503, 275.8692315326), (122.6069098503, 261.3692315326))
            ThreePointArc((122.6069098503, 261.3692315326), (125.0817835845, 255.3943577985), (119.1069098503, 257.8692315326))
            Line((119.1069098503, 257.8692315326), (-27.3930901497, 257.8692315326))
            Line((-27.3930901497, 257.8692315326), (-173.8931378334, 257.8692315326))
            ThreePointArc((-173.8931378334, 257.8692315326), (-179.8680115675, 255.3943577985), (-177.3931378334, 261.3692315326))
            Line((-177.3931378334, 261.3692315326), (-177.3931378334, 275.8692315326))
            Line((-177.3931378334, 275.8692315326), (-327.3931139915, 275.8692315326))
            Line((-327.3931139915, 275.8692315326), (-327.3931139915, 261.3692315326))
            ThreePointArc((-327.3931139915, 261.3692315326), (-324.9182402574, 255.3943577985), (-330.8931139915, 257.8692315326))
            Line((-330.8931139915, 257.8692315326), (-473.8931378334, 257.8692315326))
            ThreePointArc((-473.8931378334, 257.8692315326), (-479.8680115675, 255.3943577985), (-477.3931378334, 261.3692315326))
            Line((-477.3931378334, 261.3692315326), (-477.3931378334, 275.8692315326))
            Line((-477.3931378334, 275.8692315326), (-627.3931139915, 275.8692315326))
            Line((-627.3931139915, 275.8692315326), (-627.3931139915, 261.3692315326))
            ThreePointArc((-627.3931139915, 261.3692315326), (-624.9182402574, 255.3943577985), (-630.8931139915, 257.8692315326))
            Line((-630.8931139915, 257.8692315326), (-773.8931378334, 257.8692315326))
            ThreePointArc((-773.8931378334, 257.8692315326), (-779.8680115675, 255.3943577985), (-777.3931378334, 261.3692315326))
            Line((-777.3931378334, 261.3692315326), (-777.3931378334, 275.8692315326))
            Line((-777.3931378334, 275.8692315326), (-927.3931139915, 275.8692315326))
            Line((-927.3931139915, 275.8692315326), (-927.3931139915, 261.3692315326))
            ThreePointArc((-927.3931139915, 261.3692315326), (-924.9182402574, 255.3943577985), (-930.8931139915, 257.8692315326))
            Line((-930.8931139915, 257.8692315326), (-1127.3931139915, 257.8692315326))
            Line((-1127.3931139915, 257.8692315326), (-1127.3931139915, 97.8692322969))
        make_face()
        with BuildLine():
            Line((-22.8931139915, 190.8692322969), (-22.8931139915, 97.8692322969))
            Line((-22.8931139915, 97.8692322969), (-22.8931139915, 4.8692322969))
            ThreePointArc((-22.8931139915, 4.8692322969), (-19.3931139915, 1.3692322969), (-22.8931139915, -2.1307677031))
            Line((-22.8931139915, -2.1307677031), (-27.3931139915, -2.1307677031))
            Line((-27.3931139915, -2.1307677031), (-31.8931139915, -2.1307677031))
            ThreePointArc((-31.8931139915, -2.1307677031), (-35.3931139915, 1.3692322969), (-31.8931139915, 4.8692322969))
            Line((-31.8931139915, 4.8692322969), (-31.8931139915, 97.8692322969))
            Line((-31.8931139915, 97.8692322969), (-31.8931139915, 190.8692322969))
            ThreePointArc((-31.8931139915, 190.8692322969), (-35.3931139915, 194.3692322969), (-31.8931139915, 197.8692322969))
            Line((-31.8931139915, 197.8692322969), (-27.3931139915, 197.8692322969))
            Line((-27.3931139915, 197.8692322969), (-22.8931139915, 197.8692322969))
            ThreePointArc((-22.8931139915, 197.8692322969), (-19.3931139915, 194.3692322969), (-22.8931139915, 190.8692322969))
        make_face(mode=Mode.SUBTRACT)
    extrude(amount=F1_DEPTH)

    # F0 (on Top) → F2 (join)
    with BuildSketch(Plane.XY):
        with BuildLine():
            Line((-22.8931139915, 4.8692322969), (-22.8931139915, 97.8692322969))
            Line((-22.8931139915, 97.8692322969), (-22.8931139915, 190.8692322969))
            ThreePointArc((-22.8931139915, 190.8692322969), (-19.3931139915, 194.3692322969), (-22.8931139915, 197.8692322969))
            Line((-22.8931139915, 197.8692322969), (-27.3931139915, 197.8692322969))
            Line((-27.3931139915, 197.8692322969), (-31.8931139915, 197.8692322969))
            ThreePointArc((-31.8931139915, 197.8692322969), (-35.3931139915, 194.3692322969), (-31.8931139915, 190.8692322969))
            Line((-31.8931139915, 190.8692322969), (-31.8931139915, 97.8692322969))
            Line((-31.8931139915, 97.8692322969), (-31.8931139915, 4.8692322969))
            ThreePointArc((-31.8931139915, 4.8692322969), (-35.3931139915, 1.3692322969), (-31.8931139915, -2.1307677031))
            Line((-31.8931139915, -2.1307677031), (-27.3931139915, -2.1307677031))
            Line((-27.3931139915, -2.1307677031), (-22.8931139915, -2.1307677031))
            ThreePointArc((-22.8931139915, -2.1307677031), (-19.3931139915, 1.3692322969), (-22.8931139915, 4.8692322969))
        make_face()
    extrude(amount=F2_DEPTH)


solid = f1.part
